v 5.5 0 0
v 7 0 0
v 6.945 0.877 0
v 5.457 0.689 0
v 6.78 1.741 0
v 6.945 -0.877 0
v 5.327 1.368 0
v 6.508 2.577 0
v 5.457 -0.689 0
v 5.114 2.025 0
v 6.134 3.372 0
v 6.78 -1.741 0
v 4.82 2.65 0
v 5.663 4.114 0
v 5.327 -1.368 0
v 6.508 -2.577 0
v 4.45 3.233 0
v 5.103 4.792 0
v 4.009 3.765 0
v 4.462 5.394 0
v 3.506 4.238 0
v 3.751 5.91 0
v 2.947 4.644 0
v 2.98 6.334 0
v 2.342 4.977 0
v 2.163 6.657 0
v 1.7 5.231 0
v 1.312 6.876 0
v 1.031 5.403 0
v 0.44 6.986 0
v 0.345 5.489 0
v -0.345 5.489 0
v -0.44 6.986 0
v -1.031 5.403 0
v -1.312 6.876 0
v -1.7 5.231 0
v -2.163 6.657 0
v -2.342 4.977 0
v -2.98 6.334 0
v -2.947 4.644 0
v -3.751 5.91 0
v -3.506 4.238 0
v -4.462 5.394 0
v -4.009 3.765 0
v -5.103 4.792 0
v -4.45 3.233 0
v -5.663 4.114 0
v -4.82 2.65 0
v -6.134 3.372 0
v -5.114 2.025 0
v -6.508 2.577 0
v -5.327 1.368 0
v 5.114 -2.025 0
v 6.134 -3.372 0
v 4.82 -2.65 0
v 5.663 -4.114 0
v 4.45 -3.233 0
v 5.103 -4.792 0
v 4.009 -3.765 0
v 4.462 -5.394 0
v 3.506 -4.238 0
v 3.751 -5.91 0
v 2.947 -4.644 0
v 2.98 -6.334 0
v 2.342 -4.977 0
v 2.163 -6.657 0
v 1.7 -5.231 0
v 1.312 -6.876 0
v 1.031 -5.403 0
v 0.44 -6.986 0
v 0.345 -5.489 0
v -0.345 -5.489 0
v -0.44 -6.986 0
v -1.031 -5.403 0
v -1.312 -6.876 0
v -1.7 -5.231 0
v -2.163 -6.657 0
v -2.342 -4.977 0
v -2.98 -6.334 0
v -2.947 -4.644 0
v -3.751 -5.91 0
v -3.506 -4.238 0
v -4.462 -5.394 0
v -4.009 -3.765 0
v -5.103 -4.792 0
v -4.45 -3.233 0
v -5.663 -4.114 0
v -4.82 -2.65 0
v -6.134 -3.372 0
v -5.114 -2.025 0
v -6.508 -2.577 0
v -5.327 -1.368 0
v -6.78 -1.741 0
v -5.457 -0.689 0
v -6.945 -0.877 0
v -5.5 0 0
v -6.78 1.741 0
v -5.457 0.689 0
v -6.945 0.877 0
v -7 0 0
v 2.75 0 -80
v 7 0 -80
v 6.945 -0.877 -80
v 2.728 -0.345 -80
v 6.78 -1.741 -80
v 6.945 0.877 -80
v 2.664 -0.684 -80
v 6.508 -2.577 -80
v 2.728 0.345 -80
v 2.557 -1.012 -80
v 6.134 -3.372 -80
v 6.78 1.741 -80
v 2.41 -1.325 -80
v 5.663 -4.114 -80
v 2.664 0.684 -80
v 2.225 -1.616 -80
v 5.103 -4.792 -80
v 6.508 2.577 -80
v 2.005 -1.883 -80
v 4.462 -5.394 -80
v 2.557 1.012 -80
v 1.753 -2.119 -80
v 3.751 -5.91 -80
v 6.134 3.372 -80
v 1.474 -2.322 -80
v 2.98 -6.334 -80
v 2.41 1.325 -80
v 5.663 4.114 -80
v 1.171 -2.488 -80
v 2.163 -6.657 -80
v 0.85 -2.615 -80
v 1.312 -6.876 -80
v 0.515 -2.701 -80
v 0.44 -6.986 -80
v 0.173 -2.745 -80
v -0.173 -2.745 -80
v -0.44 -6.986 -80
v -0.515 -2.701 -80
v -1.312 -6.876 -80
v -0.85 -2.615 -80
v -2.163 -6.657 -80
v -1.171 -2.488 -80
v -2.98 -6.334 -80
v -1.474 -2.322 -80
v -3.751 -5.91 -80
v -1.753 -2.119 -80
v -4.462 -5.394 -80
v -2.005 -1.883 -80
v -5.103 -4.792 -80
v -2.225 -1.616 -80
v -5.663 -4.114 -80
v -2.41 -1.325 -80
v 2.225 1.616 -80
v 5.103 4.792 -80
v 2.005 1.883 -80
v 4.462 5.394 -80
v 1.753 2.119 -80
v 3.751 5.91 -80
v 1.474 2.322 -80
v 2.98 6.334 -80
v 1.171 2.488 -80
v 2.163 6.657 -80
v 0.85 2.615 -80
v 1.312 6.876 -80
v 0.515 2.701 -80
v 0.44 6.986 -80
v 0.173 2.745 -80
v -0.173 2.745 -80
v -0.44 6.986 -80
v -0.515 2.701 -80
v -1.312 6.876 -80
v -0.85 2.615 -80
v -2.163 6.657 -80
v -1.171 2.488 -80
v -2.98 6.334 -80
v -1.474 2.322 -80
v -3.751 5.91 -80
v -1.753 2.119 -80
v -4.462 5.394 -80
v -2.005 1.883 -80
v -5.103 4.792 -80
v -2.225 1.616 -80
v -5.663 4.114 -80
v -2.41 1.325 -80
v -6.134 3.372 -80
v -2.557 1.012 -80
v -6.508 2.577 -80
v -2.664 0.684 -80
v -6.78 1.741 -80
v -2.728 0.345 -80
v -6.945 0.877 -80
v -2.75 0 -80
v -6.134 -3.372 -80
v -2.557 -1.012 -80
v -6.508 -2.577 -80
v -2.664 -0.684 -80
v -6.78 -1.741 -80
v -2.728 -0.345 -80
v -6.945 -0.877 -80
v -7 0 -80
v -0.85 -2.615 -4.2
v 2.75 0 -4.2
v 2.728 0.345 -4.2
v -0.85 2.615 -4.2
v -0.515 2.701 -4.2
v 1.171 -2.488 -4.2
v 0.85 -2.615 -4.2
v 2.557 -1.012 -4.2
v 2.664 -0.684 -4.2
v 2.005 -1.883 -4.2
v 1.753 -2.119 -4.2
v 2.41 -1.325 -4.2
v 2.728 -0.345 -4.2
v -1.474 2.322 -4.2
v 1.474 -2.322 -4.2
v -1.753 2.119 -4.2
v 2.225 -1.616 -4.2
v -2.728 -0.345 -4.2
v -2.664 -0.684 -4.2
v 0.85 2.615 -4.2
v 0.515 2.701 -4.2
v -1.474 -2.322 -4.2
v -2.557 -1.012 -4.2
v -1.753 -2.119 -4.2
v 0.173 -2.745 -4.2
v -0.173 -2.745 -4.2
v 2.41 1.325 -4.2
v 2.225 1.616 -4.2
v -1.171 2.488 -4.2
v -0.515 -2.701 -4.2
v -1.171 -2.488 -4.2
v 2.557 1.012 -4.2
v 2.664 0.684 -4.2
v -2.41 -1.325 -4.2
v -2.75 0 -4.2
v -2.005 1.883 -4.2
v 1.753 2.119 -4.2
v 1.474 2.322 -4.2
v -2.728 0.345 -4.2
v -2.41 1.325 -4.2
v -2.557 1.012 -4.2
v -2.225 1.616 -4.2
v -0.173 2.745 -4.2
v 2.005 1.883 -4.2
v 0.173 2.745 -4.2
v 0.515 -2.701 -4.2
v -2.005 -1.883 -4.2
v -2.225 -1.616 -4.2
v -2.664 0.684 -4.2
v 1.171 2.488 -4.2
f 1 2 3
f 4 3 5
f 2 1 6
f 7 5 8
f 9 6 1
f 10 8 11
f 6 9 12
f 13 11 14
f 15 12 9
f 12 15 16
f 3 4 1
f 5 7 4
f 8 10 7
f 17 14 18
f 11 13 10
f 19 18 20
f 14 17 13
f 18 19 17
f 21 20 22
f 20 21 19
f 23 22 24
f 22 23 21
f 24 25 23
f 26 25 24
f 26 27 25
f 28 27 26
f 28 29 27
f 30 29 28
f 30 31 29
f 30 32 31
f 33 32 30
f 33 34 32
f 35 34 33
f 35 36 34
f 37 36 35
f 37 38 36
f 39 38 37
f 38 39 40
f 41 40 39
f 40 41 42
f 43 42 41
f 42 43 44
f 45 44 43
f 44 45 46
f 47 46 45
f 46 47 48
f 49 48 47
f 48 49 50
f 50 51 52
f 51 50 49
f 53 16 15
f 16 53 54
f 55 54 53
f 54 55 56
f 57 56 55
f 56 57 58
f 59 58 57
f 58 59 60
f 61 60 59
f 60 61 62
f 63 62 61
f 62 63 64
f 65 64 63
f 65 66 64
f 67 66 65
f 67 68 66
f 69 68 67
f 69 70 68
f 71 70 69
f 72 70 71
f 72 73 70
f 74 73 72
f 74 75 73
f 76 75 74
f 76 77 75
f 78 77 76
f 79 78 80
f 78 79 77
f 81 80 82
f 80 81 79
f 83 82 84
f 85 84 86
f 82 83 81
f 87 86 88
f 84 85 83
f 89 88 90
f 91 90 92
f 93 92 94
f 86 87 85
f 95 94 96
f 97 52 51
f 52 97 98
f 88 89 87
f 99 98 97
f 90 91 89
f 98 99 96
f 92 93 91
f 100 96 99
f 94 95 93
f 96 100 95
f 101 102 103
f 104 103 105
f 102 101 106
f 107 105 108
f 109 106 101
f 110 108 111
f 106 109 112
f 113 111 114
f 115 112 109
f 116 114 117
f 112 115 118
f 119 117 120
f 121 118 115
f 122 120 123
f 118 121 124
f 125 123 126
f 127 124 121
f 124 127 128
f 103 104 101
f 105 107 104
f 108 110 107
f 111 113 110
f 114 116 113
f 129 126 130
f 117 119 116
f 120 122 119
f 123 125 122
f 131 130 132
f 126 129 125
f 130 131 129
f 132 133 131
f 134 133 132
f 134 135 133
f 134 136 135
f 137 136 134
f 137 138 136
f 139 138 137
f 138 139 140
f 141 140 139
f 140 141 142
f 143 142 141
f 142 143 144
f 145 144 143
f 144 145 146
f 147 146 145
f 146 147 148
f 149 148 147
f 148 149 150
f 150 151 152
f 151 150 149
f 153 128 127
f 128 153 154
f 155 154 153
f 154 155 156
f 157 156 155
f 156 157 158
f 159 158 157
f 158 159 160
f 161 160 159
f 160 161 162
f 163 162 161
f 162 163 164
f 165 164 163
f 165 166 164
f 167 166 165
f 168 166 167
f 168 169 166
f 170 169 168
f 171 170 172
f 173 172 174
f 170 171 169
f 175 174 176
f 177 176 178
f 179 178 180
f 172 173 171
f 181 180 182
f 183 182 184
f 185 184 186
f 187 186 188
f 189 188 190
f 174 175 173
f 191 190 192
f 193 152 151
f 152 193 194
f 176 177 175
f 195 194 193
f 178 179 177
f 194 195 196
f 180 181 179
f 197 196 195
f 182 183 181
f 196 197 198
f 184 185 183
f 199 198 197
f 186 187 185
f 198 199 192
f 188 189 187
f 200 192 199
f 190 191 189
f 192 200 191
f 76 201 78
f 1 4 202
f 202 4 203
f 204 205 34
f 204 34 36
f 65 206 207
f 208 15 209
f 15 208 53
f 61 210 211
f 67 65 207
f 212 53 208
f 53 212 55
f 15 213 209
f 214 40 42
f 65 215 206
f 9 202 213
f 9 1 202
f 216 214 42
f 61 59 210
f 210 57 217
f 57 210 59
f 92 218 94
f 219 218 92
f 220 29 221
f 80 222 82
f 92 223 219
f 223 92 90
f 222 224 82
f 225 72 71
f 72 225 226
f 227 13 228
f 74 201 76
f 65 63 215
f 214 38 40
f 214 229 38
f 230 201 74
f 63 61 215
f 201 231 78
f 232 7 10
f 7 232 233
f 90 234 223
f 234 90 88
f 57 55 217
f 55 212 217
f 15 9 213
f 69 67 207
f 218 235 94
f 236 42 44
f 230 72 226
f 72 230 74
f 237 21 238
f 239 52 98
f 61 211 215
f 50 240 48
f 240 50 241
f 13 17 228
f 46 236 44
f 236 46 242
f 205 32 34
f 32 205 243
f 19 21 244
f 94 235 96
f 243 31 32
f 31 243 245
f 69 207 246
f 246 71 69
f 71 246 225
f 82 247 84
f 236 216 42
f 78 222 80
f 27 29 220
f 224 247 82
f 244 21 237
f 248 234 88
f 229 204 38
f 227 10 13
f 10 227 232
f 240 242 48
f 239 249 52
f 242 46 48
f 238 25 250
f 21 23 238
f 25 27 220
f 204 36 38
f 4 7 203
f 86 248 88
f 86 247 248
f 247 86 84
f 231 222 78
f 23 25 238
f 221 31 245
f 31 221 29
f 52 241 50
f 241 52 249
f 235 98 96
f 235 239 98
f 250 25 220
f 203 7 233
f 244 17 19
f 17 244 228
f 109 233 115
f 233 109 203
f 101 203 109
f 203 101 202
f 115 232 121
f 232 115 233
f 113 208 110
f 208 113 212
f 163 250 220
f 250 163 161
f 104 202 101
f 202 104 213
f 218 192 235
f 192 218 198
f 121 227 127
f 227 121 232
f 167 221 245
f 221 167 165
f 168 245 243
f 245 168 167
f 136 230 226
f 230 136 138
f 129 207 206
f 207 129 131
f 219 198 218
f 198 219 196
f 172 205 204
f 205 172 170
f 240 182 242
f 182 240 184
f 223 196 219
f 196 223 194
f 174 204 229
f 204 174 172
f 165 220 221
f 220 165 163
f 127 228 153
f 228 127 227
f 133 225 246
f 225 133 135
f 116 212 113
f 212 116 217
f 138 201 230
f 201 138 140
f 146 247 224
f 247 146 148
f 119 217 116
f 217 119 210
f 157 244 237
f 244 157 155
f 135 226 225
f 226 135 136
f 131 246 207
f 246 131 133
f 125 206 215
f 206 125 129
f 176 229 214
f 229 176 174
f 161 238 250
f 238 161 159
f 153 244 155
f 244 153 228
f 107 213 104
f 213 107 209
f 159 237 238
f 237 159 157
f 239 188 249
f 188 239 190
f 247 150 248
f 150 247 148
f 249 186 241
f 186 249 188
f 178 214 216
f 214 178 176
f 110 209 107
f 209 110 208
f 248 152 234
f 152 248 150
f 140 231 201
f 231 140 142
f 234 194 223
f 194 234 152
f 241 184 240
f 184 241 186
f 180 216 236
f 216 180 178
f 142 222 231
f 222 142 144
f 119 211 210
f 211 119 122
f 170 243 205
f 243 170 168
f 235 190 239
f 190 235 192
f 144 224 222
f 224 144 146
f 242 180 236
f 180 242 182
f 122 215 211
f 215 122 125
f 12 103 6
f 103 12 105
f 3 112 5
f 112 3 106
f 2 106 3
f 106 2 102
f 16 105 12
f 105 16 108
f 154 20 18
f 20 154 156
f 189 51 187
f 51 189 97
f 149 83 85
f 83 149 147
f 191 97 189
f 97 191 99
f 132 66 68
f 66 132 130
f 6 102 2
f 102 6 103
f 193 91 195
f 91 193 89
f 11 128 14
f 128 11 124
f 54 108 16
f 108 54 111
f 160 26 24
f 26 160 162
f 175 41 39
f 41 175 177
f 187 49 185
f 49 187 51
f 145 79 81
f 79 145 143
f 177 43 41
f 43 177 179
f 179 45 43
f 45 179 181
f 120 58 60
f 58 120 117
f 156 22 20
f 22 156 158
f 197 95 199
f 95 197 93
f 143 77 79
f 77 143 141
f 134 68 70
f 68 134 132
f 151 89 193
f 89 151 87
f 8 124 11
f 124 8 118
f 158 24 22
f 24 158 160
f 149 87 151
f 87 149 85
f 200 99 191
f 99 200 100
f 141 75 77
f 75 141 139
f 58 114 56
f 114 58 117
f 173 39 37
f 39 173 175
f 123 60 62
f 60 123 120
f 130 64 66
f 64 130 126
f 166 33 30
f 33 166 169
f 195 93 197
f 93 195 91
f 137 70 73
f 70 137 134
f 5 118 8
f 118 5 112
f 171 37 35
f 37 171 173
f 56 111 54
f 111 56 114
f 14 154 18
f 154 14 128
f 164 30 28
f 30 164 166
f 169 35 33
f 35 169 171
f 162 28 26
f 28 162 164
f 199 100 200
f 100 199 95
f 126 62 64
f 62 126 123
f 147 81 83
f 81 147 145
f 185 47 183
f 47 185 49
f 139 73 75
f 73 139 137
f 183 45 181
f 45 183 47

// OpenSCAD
$fn = 50;


difference() {
	union() {
		translate(v = [0, 0, -80.0000000000]) {
			cylinder(h = 80, r = 7.0000000000);
		}
		cylinder(h = 0, r = 16.0000000000);
	}
	union() {
		translate(v = [0, 0, 0]) {
			rotate(a = [0, 0, 0]) {
				difference() {
					union() {
						#translate(v = [0, 0, -80.0000000000]) {
							cylinder(h = 80, r = 2.2500000000);
						}
						#translate(v = [0, 0, -4.2000000000]) {
							cylinder(h = 4.2000000000, r1 = 2.7500000000, r2 = 5.5000000000);
						}
						#translate(v = [0, 0, -80.0000000000]) {
							cylinder(h = 80, r = 2.7500000000);
						}
						#translate(v = [0, 0, -80.0000000000]) {
							cylinder(h = 80, r = 2.2500000000);
						}
					}
					union();
				}
			}
		}
	}
}
